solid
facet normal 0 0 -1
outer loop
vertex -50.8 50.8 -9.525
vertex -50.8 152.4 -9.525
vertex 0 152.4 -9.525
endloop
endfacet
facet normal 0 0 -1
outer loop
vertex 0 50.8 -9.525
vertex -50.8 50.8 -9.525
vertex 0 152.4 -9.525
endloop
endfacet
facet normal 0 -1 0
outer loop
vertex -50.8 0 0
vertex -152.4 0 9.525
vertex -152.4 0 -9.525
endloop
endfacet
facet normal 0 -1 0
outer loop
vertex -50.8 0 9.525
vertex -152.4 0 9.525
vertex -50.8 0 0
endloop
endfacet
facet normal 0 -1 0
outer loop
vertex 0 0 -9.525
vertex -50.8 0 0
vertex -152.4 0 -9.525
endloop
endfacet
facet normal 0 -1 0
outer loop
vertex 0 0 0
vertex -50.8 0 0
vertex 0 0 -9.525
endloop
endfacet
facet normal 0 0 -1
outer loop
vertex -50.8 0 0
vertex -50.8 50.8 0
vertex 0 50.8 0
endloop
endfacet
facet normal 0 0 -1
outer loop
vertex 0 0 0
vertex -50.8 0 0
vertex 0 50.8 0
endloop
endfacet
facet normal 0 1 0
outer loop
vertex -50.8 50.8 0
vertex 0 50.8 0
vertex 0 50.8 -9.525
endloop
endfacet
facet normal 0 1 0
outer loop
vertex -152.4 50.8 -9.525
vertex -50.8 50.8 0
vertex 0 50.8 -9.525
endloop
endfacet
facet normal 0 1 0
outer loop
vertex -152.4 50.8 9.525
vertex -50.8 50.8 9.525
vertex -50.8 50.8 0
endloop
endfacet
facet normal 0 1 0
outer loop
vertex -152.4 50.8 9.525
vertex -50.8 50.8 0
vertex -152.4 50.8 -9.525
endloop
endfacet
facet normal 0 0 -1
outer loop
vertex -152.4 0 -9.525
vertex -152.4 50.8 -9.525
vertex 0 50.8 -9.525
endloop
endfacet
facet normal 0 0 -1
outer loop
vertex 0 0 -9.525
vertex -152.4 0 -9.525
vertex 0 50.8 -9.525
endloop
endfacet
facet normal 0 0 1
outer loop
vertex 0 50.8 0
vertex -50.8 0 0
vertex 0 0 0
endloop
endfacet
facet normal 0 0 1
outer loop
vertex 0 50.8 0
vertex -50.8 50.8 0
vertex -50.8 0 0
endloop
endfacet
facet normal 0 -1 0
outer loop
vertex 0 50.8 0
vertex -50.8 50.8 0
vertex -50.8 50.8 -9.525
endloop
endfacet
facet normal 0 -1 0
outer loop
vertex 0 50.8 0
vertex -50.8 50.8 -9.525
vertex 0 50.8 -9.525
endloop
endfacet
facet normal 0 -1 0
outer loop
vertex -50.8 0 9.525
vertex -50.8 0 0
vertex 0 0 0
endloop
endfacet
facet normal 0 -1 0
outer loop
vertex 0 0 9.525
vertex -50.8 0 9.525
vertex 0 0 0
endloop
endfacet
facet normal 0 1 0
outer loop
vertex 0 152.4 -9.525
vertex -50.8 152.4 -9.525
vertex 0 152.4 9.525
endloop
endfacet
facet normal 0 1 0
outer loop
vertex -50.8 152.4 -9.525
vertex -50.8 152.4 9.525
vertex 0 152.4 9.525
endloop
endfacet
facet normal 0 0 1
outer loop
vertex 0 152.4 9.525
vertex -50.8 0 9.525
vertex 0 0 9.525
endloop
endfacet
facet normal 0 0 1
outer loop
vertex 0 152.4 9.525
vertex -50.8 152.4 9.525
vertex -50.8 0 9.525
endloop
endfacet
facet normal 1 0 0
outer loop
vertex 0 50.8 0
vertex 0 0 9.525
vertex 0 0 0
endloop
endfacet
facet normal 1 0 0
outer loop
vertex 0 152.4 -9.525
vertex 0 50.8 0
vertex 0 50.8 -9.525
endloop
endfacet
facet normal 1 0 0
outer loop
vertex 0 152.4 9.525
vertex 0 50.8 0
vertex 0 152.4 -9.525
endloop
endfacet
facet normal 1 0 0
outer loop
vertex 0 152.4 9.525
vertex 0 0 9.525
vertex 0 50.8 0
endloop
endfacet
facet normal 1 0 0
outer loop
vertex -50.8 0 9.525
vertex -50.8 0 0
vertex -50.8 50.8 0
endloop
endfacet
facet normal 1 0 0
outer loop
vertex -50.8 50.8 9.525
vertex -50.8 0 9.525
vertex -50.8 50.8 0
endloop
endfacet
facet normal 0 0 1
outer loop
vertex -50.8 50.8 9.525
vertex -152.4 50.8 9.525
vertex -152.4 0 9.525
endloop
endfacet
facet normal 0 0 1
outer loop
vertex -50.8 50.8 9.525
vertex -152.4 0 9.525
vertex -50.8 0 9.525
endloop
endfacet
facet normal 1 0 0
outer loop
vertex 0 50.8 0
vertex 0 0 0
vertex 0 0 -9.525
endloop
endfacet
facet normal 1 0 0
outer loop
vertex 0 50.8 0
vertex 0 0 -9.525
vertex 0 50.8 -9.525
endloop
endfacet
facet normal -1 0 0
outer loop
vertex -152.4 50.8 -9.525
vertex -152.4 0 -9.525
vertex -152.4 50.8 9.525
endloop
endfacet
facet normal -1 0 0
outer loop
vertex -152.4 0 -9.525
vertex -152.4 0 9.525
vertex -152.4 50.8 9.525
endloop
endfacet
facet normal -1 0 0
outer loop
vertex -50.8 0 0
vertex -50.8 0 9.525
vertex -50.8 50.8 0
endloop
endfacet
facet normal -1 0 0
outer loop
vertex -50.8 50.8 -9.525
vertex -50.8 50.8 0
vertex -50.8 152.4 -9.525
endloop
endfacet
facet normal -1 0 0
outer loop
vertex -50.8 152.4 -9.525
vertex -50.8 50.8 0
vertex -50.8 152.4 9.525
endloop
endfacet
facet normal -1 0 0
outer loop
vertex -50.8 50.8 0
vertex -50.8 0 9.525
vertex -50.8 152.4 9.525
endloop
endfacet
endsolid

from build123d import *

# Parameters (mm, degrees)
F0_W     = 101.6
F0_H     = 50.8
F1_DEPTH = 9.525
F0_W_2   = 50.8
F2_DEPTH = 9.525
F0_H_2   = 101.6
F3_DEPTH = 9.525
F4_DEPTH = 9.525


with BuildPart() as f1:
    # F0 (on Top) → F1 (new body)
    with BuildSketch(Plane.XY):
        with Locations((-101.6, 25.4)):
            Rectangle(F0_W, F0_H)
    extrude(amount=F1_DEPTH)

    # F0 (on Top) → F2 (join)
    with BuildSketch(Plane.XY):
        with Locations((-25.4, 25.4)):
            Rectangle(F0_W_2, F0_H)
        with Locations((-101.6, 25.4)):
            Rectangle(F0_W, F0_H)
    extrude(amount=-F2_DEPTH)


with BuildPart() as f3:
    # F0 (on Top) → F3 (new body)
    with BuildSketch(Plane.XY):
        with Locations((-25.4, 25.4)):
            Rectangle(F0_W_2, F0_H)
        with Locations((-25.4, 101.6)):
            Rectangle(F0_W_2, F0_H_2)
    extrude(amount=F3_DEPTH)

    # F0 (on Top) → F4 (join)
    with BuildSketch(Plane.XY):
        with Locations((-25.4, 101.6)):
            Rectangle(F0_W_2, F0_H_2)
    extrude(amount=-F4_DEPTH)


solid = Compound([f1.part, f3.part])
